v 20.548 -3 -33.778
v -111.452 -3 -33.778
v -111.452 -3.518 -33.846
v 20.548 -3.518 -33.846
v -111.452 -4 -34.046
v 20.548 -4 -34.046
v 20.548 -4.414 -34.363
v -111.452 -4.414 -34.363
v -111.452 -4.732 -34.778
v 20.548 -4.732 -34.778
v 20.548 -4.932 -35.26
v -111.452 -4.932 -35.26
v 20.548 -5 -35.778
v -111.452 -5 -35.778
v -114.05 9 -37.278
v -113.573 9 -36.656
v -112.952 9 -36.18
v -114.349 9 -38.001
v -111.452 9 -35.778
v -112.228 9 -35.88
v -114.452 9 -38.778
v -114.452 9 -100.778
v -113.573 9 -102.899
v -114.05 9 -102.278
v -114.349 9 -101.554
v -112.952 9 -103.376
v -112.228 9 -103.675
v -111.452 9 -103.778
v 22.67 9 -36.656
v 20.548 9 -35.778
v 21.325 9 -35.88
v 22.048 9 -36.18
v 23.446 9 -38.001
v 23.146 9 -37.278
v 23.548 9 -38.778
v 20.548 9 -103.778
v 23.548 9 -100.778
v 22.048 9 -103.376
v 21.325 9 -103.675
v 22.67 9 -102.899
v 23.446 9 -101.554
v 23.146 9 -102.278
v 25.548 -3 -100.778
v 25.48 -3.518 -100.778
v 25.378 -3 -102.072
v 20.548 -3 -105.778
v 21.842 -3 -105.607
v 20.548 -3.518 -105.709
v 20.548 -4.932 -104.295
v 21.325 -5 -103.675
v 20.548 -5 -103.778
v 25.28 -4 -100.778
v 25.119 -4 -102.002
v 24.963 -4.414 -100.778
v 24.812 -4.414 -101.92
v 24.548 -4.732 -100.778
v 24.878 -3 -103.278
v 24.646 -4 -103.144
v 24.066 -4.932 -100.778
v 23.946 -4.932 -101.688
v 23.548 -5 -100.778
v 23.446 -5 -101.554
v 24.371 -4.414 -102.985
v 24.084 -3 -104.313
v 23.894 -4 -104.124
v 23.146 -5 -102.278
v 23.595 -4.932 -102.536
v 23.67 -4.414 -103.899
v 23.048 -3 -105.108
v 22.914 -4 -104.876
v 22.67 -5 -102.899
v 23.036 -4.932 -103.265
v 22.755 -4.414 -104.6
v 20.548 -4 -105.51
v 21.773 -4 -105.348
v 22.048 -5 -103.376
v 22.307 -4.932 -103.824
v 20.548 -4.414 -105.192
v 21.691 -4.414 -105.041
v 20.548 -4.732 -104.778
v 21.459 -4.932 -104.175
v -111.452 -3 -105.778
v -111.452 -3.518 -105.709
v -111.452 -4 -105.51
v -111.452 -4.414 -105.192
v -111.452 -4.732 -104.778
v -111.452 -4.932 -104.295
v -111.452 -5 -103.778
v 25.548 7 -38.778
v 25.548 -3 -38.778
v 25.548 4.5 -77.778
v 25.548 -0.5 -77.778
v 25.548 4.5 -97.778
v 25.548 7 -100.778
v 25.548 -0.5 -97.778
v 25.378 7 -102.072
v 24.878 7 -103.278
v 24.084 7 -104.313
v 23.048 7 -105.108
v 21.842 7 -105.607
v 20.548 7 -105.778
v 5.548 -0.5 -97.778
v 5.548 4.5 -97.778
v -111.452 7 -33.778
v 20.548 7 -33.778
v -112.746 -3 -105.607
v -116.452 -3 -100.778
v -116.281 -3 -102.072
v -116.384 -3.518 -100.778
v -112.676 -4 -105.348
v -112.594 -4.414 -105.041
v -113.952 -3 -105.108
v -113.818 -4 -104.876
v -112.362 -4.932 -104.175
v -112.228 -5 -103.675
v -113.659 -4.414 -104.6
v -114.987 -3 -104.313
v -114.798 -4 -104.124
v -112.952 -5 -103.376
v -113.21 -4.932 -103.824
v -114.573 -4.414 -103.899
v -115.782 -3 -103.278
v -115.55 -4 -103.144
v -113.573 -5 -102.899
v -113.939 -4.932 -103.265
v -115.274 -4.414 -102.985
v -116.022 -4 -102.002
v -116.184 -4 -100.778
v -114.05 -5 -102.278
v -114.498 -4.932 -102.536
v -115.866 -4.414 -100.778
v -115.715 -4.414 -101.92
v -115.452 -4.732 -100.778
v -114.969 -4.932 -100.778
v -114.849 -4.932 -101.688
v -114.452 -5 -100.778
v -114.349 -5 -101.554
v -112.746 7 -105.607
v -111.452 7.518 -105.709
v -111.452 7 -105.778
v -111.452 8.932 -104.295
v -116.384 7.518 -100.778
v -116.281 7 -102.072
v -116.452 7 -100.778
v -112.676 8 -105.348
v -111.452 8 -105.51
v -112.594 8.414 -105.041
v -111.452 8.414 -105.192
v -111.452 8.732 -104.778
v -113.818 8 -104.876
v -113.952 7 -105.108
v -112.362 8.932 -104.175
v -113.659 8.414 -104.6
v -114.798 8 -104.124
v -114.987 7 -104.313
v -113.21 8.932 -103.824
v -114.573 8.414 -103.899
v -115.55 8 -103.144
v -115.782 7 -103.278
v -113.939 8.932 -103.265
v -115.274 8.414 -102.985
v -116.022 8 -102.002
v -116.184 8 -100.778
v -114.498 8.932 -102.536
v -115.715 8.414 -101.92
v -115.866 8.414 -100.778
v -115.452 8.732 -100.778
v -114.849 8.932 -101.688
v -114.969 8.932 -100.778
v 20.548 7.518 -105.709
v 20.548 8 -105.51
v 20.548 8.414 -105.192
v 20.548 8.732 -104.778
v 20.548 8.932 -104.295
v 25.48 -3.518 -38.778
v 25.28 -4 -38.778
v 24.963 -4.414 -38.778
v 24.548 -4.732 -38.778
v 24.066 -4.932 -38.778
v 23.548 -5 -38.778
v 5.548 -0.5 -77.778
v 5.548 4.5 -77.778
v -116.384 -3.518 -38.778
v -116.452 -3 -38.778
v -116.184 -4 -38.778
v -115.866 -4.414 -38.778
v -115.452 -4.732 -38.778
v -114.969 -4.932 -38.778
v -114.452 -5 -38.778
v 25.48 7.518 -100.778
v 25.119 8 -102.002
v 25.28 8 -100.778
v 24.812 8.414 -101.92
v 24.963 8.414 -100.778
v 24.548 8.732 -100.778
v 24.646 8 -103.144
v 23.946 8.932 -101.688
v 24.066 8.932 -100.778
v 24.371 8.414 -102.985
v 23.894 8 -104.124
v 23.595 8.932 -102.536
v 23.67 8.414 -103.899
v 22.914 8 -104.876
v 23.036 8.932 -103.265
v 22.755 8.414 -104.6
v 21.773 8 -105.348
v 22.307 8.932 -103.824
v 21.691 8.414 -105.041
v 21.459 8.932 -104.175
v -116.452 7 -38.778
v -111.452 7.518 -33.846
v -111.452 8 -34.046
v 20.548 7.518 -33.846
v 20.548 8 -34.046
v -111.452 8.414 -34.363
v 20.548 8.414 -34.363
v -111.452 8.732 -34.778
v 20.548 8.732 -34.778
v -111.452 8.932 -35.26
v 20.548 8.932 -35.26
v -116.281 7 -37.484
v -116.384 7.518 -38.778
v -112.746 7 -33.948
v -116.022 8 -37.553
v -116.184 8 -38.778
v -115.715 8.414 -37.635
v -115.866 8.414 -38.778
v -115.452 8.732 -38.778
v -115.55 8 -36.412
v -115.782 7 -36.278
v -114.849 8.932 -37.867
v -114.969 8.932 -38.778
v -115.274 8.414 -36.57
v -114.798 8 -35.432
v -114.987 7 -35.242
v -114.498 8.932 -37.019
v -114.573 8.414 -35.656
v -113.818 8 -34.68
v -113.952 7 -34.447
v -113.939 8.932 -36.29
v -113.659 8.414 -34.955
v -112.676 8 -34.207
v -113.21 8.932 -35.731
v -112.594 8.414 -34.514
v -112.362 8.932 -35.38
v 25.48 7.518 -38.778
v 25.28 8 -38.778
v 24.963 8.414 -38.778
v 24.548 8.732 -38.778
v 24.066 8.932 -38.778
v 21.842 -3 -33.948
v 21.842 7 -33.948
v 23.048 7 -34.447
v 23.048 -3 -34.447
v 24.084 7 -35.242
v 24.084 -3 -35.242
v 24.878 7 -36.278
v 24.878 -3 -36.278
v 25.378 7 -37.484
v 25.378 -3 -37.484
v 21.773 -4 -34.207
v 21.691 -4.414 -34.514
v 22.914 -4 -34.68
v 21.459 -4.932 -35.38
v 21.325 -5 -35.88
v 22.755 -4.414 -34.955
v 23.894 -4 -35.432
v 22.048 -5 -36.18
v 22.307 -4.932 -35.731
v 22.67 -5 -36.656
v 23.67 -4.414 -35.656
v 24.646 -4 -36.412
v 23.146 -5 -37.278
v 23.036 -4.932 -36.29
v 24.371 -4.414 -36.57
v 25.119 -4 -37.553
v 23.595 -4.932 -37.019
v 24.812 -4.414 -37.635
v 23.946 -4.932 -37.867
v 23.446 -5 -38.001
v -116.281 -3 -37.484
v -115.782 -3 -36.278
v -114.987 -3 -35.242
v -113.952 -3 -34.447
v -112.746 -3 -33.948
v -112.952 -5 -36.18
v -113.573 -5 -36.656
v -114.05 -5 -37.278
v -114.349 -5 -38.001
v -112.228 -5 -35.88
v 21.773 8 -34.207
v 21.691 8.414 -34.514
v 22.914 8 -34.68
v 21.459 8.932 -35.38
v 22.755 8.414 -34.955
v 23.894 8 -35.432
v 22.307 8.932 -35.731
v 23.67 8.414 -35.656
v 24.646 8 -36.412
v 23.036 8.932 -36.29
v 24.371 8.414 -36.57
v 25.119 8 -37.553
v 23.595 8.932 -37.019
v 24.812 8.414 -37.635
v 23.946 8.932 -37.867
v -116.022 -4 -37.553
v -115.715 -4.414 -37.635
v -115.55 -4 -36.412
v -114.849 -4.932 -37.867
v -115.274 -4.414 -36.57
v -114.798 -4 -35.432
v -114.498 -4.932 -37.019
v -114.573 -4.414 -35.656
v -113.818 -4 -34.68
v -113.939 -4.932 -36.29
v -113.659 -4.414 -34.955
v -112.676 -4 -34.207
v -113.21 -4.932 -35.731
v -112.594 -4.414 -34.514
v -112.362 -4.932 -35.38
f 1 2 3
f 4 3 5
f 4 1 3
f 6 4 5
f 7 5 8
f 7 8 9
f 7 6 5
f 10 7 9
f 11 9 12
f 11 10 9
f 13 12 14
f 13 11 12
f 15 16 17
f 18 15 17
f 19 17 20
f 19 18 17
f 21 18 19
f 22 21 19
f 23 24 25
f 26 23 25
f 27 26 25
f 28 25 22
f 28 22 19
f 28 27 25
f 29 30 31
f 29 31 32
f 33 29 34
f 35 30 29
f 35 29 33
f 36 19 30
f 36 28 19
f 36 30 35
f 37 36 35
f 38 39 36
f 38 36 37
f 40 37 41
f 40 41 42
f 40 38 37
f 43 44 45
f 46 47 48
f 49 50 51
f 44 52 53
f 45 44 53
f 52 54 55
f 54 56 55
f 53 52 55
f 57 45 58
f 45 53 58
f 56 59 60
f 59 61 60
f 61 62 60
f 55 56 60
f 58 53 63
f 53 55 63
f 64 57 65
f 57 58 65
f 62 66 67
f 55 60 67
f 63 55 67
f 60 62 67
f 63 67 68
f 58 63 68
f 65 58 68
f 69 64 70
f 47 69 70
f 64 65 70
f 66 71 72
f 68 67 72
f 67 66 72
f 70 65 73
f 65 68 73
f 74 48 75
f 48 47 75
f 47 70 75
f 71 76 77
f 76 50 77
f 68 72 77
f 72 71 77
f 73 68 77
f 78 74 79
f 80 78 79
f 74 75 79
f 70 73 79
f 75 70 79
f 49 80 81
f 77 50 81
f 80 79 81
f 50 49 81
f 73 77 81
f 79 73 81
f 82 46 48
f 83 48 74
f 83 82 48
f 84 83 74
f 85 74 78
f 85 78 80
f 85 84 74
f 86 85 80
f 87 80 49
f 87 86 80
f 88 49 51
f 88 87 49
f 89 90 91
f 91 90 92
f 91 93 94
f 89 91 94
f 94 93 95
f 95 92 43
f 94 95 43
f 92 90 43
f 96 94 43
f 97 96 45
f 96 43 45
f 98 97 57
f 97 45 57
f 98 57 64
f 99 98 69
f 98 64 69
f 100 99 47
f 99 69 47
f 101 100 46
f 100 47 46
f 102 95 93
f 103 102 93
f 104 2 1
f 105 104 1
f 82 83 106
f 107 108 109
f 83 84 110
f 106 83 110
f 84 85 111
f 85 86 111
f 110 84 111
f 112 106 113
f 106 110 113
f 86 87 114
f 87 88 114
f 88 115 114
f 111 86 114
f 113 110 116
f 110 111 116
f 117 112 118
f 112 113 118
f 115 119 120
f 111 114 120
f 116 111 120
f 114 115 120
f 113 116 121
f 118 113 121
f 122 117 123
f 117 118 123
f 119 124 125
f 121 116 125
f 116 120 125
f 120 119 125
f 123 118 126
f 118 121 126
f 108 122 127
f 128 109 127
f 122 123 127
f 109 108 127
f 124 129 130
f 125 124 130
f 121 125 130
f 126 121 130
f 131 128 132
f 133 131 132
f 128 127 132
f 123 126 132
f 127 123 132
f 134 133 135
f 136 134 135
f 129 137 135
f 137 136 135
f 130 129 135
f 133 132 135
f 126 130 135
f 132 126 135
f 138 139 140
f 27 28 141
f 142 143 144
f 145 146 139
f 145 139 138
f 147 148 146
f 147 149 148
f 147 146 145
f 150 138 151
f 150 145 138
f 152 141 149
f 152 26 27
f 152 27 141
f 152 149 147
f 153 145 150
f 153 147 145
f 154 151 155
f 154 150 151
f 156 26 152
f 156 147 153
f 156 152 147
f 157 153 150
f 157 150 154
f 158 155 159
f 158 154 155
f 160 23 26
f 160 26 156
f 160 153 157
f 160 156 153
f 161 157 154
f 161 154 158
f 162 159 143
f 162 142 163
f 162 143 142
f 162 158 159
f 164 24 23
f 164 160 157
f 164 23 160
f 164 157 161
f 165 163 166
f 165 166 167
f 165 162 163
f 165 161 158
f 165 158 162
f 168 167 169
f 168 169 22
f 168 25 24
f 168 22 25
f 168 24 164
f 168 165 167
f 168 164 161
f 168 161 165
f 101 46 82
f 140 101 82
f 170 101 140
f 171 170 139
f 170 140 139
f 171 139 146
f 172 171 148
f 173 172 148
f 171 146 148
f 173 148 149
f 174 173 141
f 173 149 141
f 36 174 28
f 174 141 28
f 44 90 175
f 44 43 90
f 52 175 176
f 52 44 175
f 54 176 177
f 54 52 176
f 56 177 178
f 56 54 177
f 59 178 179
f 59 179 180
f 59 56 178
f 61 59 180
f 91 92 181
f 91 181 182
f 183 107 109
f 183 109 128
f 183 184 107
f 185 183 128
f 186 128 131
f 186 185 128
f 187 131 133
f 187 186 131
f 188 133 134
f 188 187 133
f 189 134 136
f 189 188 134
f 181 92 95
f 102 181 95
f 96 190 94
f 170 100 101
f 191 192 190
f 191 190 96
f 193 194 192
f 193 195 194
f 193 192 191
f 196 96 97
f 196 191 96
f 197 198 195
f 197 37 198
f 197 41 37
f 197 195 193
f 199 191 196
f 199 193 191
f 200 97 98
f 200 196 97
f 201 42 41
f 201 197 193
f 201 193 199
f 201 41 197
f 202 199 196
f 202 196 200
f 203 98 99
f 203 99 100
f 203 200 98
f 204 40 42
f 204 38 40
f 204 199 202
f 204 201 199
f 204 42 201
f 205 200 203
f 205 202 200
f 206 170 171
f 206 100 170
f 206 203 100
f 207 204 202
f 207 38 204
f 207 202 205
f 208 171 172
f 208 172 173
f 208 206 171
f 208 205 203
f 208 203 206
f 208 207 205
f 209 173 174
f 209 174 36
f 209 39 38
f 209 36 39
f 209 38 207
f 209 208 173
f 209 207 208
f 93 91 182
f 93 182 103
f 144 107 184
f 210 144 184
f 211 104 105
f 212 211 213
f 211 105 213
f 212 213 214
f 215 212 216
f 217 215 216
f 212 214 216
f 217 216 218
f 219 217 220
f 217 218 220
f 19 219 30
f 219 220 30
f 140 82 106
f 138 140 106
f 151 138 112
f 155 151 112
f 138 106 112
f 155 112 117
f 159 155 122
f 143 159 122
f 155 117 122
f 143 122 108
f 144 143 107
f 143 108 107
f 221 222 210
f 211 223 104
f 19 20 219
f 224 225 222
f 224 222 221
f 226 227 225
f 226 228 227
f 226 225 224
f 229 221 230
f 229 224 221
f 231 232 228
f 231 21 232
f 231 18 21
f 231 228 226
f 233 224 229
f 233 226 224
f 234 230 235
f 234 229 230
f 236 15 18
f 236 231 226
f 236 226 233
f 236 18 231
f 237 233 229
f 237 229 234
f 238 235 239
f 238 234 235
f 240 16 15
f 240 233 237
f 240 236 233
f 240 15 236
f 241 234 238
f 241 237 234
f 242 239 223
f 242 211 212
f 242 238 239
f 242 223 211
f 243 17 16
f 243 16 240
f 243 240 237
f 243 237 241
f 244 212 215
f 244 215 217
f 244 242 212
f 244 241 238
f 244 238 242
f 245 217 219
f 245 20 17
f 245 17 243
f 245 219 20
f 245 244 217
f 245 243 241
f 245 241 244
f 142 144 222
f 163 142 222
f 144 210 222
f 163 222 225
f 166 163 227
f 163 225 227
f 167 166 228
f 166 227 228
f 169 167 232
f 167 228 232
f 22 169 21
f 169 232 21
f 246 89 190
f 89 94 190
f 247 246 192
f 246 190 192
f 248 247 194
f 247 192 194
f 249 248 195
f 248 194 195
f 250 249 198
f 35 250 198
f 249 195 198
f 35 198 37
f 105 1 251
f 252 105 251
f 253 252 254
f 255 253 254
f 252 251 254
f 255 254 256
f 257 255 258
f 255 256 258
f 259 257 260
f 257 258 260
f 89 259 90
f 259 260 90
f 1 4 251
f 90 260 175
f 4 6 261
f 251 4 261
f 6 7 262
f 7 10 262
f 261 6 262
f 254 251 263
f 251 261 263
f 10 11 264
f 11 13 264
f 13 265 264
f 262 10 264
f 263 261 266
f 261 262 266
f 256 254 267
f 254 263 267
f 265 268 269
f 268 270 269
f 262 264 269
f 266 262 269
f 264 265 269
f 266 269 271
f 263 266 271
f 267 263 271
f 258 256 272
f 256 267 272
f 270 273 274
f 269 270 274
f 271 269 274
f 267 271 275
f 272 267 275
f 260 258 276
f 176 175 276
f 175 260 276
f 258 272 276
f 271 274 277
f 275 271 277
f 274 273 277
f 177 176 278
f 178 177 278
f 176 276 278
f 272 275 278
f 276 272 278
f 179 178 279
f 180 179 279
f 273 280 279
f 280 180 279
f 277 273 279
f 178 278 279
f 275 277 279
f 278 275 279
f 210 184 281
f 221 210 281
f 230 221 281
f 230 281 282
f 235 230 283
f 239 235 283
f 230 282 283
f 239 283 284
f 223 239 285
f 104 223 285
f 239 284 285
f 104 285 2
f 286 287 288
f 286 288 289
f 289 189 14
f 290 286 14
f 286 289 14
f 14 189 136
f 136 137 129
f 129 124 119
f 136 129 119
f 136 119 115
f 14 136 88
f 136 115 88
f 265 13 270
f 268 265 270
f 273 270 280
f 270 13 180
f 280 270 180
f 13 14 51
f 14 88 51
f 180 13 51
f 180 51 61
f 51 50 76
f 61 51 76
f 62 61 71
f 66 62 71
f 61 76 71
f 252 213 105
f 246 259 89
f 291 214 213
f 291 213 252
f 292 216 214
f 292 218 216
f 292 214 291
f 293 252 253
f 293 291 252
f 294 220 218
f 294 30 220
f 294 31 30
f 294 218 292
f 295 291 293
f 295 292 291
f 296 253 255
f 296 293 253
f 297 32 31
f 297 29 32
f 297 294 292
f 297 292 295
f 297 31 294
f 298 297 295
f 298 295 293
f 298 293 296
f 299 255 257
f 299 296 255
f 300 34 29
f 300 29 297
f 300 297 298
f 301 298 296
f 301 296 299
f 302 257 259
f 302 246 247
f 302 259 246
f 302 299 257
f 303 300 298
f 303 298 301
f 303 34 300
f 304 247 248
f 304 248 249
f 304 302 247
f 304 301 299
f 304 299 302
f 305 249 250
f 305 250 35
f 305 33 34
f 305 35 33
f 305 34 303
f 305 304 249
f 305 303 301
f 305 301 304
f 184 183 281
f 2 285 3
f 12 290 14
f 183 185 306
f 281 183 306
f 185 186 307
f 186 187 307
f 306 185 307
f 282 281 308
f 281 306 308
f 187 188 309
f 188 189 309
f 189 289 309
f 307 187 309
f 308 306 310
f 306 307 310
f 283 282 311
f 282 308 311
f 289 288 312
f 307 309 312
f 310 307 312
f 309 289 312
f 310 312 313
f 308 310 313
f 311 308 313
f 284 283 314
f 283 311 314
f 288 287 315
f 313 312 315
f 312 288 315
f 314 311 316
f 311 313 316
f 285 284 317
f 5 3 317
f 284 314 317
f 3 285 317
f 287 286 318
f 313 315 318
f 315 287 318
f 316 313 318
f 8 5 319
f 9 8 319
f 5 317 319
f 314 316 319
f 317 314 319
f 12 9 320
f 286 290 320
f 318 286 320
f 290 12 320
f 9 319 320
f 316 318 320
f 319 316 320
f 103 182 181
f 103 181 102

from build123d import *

# Parameters (mm, degrees)
BOSS_EXTRUDE1_DEPTH = 14
FILLET1_R           = 2
SKETCH2_W           = 20
SKETCH2_H           = 5
CUT_EXTRUDE1_DEPTH  = 20


with BuildPart() as part:
    # Sketch1 → Boss-Extrude1 (new body)
    with BuildSketch(Plane(origin=(0, -5, 0), x_dir=(1, 0, 0), z_dir=(0, 1, 0))):
        with BuildLine():
            Line((-111.451663584, 33.777598009), (20.548336416, 33.777598009))
            ThreePointArc((20.548336416, 33.777598009), (24.083870322, 35.242064103), (25.548336416, 38.777598009))
            Line((25.548336416, 38.777598009), (25.548336416, 100.777598009))
            ThreePointArc((25.548336416, 100.777598009), (24.083870322, 104.313131915), (20.548336416, 105.777598009))
            Line((20.548336416, 105.777598009), (-111.451663584, 105.777598009))
            ThreePointArc((-111.451663584, 105.777598009), (-114.98719749, 104.313131915), (-116.451663584, 100.777598009))
            Line((-116.451663584, 100.777598009), (-116.451663584, 38.777598009))
            ThreePointArc((-116.451663584, 38.777598009), (-114.98719749, 35.242064103), (-111.451663584, 33.777598009))
        make_face()
    extrude(amount=BOSS_EXTRUDE1_DEPTH)

    # Fillet1
    fillet1_edges = [part.edges().sort_by_distance(p)[0] for p in [
        (-114.98719749, 9, -35.242064103),
        (-116.451663584, -5, -69.777598009),
        (-114.98719749, -5, -104.313131915),
        (-45.451663584, 9, -33.777598009),
        (24.083870322, 9, -35.242064103),
        (25.548336416, 9, -69.777598009),
        (24.083870322, 9, -104.313131915),
        (-45.451663584, 9, -105.777598009),
        (-114.98719749, 9, -104.313131915),
        (-116.451663584, 9, -69.777598009),
        (-45.451663584, -5, -105.777598009),
        (24.083870322, -5, -104.313131915),
        (25.548336416, -5, -69.777598009),
        (24.083870322, -5, -35.242064103),
        (-45.451663584, -5, -33.777598009),
        (-114.98719749, -5, -35.242064103),
    ]]
    fillet(fillet1_edges, radius=FILLET1_R)

    # Sketch2 → Cut-Extrude1 (cut)
    with BuildSketch(Plane(origin=(25.548336416, 0, 0), x_dir=(0, 0, -1), z_dir=(1, 0, 0))):
        with Locations((87.777598009, 2)):
            Rectangle(SKETCH2_W, SKETCH2_H)
    extrude(amount=-CUT_EXTRUDE1_DEPTH, mode=Mode.SUBTRACT)


solid = part.part
